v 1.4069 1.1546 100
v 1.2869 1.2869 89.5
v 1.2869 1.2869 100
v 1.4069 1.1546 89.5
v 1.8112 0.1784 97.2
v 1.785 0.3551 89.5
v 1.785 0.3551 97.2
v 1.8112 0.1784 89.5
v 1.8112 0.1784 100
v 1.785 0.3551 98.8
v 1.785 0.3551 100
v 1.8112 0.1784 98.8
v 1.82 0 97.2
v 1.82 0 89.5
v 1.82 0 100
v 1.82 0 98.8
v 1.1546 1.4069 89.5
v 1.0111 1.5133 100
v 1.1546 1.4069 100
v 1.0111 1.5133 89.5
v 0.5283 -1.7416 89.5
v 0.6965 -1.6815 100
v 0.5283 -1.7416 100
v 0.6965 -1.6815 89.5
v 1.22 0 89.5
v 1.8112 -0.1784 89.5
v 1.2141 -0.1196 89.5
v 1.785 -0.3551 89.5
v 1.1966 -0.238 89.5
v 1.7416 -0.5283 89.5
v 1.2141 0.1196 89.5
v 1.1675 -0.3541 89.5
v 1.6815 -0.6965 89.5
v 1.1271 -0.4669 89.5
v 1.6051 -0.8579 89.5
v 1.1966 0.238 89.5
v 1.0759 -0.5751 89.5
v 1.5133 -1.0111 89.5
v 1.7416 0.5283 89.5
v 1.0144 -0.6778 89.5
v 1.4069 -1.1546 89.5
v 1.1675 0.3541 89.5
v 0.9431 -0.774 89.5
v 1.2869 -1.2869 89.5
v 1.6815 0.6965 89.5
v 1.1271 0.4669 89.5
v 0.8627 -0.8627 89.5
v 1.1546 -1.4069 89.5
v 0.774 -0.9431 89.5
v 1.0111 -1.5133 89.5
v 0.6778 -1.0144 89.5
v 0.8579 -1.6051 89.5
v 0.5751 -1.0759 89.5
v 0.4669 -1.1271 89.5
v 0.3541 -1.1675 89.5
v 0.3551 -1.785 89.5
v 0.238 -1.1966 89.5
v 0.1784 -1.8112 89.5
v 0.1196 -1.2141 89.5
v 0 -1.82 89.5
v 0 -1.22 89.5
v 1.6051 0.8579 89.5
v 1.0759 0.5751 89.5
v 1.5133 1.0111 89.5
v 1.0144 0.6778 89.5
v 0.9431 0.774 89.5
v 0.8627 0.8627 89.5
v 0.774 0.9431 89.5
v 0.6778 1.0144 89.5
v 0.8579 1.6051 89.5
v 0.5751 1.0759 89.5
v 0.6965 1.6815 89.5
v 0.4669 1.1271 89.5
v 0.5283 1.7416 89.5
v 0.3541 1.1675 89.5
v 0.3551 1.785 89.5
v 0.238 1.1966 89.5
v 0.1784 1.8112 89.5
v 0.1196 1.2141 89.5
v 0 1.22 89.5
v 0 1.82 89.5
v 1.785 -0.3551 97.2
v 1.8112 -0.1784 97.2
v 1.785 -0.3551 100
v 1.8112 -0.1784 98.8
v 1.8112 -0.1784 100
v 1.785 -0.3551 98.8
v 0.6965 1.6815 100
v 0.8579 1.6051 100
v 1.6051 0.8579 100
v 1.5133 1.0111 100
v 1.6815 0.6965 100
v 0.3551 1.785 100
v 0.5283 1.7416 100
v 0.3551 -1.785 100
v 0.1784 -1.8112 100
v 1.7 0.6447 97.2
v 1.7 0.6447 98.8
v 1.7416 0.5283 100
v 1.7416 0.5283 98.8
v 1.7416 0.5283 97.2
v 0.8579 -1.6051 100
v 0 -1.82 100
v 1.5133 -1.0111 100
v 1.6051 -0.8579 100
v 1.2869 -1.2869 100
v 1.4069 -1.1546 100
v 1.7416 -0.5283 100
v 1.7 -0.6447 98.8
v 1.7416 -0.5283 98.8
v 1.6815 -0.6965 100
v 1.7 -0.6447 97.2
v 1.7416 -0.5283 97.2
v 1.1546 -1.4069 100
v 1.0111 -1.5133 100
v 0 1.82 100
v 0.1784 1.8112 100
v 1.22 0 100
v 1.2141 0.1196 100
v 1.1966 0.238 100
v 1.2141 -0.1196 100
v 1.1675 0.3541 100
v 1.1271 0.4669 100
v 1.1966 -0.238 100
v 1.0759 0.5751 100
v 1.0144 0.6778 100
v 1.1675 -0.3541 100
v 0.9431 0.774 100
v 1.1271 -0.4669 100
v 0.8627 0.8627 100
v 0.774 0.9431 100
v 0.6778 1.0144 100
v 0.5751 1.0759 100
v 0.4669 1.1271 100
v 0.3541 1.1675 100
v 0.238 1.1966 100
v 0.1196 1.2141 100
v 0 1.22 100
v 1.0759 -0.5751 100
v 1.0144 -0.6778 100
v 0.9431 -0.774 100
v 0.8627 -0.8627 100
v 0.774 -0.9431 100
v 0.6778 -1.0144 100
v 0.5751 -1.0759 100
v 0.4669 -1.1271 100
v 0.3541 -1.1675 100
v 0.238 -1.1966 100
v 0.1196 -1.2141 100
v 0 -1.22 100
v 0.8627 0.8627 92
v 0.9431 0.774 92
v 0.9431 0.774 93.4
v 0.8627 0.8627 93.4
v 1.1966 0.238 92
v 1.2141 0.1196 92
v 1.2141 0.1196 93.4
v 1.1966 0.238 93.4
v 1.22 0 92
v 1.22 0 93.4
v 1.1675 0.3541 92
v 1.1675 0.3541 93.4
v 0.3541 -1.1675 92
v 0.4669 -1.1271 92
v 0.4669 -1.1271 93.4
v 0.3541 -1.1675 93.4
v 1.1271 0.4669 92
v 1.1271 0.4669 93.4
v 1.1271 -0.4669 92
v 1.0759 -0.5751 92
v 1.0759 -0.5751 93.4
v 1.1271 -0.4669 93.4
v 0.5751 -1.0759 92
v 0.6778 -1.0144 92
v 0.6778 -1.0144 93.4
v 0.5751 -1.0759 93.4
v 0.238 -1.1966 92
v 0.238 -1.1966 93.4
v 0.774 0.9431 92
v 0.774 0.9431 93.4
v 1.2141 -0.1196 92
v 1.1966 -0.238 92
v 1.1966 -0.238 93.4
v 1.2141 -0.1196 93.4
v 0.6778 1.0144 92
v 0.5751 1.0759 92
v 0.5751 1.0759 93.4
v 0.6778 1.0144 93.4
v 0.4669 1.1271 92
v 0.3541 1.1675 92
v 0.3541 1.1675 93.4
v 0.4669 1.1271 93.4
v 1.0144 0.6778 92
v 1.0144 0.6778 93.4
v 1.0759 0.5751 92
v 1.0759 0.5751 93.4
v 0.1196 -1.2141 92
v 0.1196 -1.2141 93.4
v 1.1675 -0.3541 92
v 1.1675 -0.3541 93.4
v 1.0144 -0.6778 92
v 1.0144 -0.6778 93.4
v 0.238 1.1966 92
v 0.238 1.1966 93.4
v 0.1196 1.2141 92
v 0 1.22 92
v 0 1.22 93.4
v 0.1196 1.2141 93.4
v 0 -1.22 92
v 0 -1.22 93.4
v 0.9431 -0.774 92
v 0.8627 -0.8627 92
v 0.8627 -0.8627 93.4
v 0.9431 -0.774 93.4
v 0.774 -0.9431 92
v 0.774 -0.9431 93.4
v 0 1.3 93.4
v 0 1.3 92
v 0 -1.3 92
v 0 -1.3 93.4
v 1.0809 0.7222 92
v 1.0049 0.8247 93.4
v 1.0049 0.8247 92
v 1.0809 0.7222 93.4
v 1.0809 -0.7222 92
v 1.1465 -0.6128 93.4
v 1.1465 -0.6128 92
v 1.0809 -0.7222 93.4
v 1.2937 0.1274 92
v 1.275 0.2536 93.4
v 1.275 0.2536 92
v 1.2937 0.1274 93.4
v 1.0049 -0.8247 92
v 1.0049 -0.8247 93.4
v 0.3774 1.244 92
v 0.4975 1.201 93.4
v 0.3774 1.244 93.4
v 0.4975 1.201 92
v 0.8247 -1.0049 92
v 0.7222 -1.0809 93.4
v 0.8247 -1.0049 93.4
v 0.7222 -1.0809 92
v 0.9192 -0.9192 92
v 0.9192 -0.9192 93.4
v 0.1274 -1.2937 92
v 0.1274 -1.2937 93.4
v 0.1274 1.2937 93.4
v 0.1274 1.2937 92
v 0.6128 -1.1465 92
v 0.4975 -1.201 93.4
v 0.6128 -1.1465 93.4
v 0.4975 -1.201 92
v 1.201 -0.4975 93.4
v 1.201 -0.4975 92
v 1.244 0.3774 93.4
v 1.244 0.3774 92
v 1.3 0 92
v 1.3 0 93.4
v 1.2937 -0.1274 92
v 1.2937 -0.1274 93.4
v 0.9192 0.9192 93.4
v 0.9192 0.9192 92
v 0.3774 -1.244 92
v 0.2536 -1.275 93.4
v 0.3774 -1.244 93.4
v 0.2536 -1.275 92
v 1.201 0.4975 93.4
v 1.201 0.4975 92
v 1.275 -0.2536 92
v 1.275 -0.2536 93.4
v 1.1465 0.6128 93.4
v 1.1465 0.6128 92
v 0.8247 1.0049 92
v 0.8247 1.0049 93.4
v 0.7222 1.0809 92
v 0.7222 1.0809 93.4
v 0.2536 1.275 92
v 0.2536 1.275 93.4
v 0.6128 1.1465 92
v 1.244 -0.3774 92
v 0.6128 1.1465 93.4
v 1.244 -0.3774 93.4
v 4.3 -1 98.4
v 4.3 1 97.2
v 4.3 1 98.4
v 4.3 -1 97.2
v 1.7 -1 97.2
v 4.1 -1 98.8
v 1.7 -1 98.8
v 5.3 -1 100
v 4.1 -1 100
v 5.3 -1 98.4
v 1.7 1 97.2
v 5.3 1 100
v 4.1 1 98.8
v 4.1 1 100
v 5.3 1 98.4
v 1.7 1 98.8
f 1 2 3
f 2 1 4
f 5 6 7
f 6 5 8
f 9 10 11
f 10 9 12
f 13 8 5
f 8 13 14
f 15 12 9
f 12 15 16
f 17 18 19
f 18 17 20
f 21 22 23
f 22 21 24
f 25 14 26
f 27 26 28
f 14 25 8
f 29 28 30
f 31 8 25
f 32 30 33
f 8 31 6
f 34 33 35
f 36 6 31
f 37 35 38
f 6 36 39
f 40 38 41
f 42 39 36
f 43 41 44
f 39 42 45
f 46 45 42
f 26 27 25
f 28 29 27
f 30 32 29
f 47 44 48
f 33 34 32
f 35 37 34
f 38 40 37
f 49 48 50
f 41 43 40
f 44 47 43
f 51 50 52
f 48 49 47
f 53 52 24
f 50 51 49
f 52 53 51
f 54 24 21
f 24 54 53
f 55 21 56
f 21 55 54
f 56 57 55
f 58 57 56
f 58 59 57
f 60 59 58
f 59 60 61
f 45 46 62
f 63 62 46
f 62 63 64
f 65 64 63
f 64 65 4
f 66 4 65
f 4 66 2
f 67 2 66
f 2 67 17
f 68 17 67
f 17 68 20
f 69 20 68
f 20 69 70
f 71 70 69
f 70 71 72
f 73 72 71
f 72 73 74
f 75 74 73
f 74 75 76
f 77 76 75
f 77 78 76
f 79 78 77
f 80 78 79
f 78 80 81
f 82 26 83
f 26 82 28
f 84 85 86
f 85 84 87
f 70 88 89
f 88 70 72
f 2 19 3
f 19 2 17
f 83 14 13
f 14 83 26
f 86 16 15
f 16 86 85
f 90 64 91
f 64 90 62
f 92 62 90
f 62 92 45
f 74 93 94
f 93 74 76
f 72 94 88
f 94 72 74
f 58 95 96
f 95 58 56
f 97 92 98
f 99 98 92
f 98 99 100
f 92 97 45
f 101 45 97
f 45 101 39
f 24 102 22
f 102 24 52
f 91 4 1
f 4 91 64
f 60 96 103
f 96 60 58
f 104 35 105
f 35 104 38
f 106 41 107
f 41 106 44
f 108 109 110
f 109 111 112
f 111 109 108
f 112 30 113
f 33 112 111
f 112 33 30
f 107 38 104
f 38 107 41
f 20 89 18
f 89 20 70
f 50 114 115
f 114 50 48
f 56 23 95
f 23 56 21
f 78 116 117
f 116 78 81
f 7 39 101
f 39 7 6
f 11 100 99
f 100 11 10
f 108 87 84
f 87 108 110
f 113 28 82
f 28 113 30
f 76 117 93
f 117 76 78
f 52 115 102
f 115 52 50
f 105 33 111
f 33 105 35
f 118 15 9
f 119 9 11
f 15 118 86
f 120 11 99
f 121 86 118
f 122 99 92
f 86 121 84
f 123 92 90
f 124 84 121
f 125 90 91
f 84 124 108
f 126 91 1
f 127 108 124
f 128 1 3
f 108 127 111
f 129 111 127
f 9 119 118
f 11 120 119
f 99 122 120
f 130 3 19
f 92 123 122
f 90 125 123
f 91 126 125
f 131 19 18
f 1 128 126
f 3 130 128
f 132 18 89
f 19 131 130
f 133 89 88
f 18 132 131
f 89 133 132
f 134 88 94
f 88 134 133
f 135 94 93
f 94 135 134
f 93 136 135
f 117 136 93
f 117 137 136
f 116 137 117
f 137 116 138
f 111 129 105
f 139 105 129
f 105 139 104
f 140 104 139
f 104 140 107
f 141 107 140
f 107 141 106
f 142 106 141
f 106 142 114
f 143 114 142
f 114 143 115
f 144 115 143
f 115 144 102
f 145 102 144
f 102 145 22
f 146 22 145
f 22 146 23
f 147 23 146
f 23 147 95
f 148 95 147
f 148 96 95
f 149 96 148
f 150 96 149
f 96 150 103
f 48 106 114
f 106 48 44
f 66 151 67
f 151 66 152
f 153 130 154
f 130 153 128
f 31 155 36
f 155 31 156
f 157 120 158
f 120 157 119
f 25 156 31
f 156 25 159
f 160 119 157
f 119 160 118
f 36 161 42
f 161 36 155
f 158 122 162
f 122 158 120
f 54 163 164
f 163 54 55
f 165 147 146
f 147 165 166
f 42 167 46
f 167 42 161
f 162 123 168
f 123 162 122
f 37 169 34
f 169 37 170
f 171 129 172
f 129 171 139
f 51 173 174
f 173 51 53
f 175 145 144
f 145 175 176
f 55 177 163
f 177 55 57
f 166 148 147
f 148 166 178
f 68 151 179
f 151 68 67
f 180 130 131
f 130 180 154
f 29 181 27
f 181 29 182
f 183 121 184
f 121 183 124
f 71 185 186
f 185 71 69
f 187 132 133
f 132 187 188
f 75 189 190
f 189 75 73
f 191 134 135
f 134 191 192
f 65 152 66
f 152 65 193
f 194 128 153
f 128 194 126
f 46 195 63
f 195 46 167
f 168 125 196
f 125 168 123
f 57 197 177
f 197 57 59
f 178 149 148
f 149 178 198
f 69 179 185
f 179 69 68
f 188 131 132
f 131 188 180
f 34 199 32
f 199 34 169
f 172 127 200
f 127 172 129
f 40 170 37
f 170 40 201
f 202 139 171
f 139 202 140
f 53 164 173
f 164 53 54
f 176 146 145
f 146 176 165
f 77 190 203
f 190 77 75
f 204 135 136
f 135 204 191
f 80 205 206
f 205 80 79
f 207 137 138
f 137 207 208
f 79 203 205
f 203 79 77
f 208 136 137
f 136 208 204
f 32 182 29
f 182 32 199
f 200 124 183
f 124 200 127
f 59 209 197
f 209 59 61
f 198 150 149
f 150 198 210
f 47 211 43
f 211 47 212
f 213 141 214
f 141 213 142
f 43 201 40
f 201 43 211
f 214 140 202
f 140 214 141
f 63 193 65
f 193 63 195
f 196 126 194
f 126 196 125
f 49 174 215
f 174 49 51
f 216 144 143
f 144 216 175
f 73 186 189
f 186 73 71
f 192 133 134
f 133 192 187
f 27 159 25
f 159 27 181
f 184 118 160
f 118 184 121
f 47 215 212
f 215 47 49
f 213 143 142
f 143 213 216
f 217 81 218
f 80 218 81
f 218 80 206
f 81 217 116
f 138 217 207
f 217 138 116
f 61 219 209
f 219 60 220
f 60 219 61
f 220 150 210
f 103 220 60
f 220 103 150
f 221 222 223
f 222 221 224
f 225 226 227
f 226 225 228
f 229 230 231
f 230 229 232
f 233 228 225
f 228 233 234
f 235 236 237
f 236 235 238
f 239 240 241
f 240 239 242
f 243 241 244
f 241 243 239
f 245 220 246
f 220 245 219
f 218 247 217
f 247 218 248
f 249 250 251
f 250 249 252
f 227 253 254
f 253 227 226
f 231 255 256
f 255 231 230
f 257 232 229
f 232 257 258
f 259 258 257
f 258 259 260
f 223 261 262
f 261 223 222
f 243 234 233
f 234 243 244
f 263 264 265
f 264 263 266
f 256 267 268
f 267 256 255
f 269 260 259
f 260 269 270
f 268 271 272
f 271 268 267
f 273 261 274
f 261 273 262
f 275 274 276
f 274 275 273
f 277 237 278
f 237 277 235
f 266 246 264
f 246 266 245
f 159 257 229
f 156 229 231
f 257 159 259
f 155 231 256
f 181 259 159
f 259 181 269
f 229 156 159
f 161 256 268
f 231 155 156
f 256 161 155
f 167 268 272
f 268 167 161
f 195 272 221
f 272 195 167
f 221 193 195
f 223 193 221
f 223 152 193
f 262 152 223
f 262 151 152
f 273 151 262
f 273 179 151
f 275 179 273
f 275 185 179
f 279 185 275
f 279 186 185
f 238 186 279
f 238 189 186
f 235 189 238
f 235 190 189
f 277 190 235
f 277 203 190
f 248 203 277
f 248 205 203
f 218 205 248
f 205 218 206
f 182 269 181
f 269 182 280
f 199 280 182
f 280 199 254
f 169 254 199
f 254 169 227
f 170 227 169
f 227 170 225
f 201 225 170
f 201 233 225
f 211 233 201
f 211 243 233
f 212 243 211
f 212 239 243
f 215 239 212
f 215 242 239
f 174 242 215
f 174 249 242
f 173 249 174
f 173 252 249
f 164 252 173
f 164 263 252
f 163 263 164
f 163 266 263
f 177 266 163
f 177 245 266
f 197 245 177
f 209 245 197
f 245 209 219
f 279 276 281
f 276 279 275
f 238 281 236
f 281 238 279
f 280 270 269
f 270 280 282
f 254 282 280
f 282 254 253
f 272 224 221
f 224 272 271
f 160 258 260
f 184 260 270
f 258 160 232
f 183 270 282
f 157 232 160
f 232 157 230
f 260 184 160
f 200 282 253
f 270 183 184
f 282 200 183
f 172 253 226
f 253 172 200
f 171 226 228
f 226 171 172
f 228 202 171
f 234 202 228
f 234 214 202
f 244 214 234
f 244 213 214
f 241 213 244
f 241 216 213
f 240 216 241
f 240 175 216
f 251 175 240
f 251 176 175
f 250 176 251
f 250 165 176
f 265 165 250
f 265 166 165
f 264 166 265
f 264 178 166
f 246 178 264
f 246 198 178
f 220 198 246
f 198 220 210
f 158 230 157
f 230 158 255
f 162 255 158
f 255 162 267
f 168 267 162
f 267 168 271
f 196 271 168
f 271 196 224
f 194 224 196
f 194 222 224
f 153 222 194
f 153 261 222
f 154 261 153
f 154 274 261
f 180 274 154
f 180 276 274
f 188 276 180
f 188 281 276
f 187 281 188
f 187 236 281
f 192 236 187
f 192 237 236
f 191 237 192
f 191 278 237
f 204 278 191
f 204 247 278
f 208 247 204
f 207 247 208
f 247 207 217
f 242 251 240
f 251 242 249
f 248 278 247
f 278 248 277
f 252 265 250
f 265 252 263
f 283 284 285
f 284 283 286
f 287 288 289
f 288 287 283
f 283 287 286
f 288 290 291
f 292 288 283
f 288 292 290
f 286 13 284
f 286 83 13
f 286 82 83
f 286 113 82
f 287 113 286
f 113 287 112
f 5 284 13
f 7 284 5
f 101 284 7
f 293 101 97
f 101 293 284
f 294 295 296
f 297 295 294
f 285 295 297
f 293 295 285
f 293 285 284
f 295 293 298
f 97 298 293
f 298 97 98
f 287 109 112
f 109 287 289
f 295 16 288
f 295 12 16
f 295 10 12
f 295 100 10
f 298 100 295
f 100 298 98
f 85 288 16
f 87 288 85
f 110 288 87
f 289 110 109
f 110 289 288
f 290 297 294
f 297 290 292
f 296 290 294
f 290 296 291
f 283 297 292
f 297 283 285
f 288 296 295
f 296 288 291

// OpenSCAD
$fn = 64;
// Black carrier v2.1: sleeve 89.5..100, snap rib 92..93.4, outer track arm.
PAD_R      = 4.7;
ARM_TOP    = 100.0;
SLEEVE_TOP = 100.0;
SLEEVE_BOT = 89.5;
SHELL_ID   = 1.22;
SHELL_OD   = 1.82;

module half_shell() {
    difference() {
        intersection() {
            difference() {
                translate([0,0,SLEEVE_BOT])
                    cylinder(h=SLEEVE_TOP-SLEEVE_BOT, r=SHELL_OD, center=false);
                translate([0,0,SLEEVE_BOT-0.1])
                    cylinder(h=SLEEVE_TOP-SLEEVE_BOT+0.2, r=SHELL_ID, center=false);
            }
            translate([0,-2,SLEEVE_BOT-0.2])
                cube([2,4,SLEEVE_TOP-SLEEVE_BOT+0.4], center=false);
        }
        intersection() {
            difference() {
                translate([0,0,92.0]) cylinder(h=1.4, r=1.30, center=false);
                translate([0,0,91.9]) cylinder(h=1.6, r=1.00, center=false);
            }
            translate([0,-2,91.8]) cube([2,4,1.8], center=false);
        }
    }
}

module arm() {
    hull() {
        translate([1.70, -1.0, 97.2]) cube([0.2, 2.0, 1.6], center=false);
        translate([PAD_R-0.6, -1.0, 97.2]) cube([0.2, 2.0, 1.6], center=false);
    }
    translate([PAD_R-0.6, -1.0, 98.4])
        cube([1.2, 2.0, ARM_TOP-98.4], center=false);
}

half_shell();
arm();
